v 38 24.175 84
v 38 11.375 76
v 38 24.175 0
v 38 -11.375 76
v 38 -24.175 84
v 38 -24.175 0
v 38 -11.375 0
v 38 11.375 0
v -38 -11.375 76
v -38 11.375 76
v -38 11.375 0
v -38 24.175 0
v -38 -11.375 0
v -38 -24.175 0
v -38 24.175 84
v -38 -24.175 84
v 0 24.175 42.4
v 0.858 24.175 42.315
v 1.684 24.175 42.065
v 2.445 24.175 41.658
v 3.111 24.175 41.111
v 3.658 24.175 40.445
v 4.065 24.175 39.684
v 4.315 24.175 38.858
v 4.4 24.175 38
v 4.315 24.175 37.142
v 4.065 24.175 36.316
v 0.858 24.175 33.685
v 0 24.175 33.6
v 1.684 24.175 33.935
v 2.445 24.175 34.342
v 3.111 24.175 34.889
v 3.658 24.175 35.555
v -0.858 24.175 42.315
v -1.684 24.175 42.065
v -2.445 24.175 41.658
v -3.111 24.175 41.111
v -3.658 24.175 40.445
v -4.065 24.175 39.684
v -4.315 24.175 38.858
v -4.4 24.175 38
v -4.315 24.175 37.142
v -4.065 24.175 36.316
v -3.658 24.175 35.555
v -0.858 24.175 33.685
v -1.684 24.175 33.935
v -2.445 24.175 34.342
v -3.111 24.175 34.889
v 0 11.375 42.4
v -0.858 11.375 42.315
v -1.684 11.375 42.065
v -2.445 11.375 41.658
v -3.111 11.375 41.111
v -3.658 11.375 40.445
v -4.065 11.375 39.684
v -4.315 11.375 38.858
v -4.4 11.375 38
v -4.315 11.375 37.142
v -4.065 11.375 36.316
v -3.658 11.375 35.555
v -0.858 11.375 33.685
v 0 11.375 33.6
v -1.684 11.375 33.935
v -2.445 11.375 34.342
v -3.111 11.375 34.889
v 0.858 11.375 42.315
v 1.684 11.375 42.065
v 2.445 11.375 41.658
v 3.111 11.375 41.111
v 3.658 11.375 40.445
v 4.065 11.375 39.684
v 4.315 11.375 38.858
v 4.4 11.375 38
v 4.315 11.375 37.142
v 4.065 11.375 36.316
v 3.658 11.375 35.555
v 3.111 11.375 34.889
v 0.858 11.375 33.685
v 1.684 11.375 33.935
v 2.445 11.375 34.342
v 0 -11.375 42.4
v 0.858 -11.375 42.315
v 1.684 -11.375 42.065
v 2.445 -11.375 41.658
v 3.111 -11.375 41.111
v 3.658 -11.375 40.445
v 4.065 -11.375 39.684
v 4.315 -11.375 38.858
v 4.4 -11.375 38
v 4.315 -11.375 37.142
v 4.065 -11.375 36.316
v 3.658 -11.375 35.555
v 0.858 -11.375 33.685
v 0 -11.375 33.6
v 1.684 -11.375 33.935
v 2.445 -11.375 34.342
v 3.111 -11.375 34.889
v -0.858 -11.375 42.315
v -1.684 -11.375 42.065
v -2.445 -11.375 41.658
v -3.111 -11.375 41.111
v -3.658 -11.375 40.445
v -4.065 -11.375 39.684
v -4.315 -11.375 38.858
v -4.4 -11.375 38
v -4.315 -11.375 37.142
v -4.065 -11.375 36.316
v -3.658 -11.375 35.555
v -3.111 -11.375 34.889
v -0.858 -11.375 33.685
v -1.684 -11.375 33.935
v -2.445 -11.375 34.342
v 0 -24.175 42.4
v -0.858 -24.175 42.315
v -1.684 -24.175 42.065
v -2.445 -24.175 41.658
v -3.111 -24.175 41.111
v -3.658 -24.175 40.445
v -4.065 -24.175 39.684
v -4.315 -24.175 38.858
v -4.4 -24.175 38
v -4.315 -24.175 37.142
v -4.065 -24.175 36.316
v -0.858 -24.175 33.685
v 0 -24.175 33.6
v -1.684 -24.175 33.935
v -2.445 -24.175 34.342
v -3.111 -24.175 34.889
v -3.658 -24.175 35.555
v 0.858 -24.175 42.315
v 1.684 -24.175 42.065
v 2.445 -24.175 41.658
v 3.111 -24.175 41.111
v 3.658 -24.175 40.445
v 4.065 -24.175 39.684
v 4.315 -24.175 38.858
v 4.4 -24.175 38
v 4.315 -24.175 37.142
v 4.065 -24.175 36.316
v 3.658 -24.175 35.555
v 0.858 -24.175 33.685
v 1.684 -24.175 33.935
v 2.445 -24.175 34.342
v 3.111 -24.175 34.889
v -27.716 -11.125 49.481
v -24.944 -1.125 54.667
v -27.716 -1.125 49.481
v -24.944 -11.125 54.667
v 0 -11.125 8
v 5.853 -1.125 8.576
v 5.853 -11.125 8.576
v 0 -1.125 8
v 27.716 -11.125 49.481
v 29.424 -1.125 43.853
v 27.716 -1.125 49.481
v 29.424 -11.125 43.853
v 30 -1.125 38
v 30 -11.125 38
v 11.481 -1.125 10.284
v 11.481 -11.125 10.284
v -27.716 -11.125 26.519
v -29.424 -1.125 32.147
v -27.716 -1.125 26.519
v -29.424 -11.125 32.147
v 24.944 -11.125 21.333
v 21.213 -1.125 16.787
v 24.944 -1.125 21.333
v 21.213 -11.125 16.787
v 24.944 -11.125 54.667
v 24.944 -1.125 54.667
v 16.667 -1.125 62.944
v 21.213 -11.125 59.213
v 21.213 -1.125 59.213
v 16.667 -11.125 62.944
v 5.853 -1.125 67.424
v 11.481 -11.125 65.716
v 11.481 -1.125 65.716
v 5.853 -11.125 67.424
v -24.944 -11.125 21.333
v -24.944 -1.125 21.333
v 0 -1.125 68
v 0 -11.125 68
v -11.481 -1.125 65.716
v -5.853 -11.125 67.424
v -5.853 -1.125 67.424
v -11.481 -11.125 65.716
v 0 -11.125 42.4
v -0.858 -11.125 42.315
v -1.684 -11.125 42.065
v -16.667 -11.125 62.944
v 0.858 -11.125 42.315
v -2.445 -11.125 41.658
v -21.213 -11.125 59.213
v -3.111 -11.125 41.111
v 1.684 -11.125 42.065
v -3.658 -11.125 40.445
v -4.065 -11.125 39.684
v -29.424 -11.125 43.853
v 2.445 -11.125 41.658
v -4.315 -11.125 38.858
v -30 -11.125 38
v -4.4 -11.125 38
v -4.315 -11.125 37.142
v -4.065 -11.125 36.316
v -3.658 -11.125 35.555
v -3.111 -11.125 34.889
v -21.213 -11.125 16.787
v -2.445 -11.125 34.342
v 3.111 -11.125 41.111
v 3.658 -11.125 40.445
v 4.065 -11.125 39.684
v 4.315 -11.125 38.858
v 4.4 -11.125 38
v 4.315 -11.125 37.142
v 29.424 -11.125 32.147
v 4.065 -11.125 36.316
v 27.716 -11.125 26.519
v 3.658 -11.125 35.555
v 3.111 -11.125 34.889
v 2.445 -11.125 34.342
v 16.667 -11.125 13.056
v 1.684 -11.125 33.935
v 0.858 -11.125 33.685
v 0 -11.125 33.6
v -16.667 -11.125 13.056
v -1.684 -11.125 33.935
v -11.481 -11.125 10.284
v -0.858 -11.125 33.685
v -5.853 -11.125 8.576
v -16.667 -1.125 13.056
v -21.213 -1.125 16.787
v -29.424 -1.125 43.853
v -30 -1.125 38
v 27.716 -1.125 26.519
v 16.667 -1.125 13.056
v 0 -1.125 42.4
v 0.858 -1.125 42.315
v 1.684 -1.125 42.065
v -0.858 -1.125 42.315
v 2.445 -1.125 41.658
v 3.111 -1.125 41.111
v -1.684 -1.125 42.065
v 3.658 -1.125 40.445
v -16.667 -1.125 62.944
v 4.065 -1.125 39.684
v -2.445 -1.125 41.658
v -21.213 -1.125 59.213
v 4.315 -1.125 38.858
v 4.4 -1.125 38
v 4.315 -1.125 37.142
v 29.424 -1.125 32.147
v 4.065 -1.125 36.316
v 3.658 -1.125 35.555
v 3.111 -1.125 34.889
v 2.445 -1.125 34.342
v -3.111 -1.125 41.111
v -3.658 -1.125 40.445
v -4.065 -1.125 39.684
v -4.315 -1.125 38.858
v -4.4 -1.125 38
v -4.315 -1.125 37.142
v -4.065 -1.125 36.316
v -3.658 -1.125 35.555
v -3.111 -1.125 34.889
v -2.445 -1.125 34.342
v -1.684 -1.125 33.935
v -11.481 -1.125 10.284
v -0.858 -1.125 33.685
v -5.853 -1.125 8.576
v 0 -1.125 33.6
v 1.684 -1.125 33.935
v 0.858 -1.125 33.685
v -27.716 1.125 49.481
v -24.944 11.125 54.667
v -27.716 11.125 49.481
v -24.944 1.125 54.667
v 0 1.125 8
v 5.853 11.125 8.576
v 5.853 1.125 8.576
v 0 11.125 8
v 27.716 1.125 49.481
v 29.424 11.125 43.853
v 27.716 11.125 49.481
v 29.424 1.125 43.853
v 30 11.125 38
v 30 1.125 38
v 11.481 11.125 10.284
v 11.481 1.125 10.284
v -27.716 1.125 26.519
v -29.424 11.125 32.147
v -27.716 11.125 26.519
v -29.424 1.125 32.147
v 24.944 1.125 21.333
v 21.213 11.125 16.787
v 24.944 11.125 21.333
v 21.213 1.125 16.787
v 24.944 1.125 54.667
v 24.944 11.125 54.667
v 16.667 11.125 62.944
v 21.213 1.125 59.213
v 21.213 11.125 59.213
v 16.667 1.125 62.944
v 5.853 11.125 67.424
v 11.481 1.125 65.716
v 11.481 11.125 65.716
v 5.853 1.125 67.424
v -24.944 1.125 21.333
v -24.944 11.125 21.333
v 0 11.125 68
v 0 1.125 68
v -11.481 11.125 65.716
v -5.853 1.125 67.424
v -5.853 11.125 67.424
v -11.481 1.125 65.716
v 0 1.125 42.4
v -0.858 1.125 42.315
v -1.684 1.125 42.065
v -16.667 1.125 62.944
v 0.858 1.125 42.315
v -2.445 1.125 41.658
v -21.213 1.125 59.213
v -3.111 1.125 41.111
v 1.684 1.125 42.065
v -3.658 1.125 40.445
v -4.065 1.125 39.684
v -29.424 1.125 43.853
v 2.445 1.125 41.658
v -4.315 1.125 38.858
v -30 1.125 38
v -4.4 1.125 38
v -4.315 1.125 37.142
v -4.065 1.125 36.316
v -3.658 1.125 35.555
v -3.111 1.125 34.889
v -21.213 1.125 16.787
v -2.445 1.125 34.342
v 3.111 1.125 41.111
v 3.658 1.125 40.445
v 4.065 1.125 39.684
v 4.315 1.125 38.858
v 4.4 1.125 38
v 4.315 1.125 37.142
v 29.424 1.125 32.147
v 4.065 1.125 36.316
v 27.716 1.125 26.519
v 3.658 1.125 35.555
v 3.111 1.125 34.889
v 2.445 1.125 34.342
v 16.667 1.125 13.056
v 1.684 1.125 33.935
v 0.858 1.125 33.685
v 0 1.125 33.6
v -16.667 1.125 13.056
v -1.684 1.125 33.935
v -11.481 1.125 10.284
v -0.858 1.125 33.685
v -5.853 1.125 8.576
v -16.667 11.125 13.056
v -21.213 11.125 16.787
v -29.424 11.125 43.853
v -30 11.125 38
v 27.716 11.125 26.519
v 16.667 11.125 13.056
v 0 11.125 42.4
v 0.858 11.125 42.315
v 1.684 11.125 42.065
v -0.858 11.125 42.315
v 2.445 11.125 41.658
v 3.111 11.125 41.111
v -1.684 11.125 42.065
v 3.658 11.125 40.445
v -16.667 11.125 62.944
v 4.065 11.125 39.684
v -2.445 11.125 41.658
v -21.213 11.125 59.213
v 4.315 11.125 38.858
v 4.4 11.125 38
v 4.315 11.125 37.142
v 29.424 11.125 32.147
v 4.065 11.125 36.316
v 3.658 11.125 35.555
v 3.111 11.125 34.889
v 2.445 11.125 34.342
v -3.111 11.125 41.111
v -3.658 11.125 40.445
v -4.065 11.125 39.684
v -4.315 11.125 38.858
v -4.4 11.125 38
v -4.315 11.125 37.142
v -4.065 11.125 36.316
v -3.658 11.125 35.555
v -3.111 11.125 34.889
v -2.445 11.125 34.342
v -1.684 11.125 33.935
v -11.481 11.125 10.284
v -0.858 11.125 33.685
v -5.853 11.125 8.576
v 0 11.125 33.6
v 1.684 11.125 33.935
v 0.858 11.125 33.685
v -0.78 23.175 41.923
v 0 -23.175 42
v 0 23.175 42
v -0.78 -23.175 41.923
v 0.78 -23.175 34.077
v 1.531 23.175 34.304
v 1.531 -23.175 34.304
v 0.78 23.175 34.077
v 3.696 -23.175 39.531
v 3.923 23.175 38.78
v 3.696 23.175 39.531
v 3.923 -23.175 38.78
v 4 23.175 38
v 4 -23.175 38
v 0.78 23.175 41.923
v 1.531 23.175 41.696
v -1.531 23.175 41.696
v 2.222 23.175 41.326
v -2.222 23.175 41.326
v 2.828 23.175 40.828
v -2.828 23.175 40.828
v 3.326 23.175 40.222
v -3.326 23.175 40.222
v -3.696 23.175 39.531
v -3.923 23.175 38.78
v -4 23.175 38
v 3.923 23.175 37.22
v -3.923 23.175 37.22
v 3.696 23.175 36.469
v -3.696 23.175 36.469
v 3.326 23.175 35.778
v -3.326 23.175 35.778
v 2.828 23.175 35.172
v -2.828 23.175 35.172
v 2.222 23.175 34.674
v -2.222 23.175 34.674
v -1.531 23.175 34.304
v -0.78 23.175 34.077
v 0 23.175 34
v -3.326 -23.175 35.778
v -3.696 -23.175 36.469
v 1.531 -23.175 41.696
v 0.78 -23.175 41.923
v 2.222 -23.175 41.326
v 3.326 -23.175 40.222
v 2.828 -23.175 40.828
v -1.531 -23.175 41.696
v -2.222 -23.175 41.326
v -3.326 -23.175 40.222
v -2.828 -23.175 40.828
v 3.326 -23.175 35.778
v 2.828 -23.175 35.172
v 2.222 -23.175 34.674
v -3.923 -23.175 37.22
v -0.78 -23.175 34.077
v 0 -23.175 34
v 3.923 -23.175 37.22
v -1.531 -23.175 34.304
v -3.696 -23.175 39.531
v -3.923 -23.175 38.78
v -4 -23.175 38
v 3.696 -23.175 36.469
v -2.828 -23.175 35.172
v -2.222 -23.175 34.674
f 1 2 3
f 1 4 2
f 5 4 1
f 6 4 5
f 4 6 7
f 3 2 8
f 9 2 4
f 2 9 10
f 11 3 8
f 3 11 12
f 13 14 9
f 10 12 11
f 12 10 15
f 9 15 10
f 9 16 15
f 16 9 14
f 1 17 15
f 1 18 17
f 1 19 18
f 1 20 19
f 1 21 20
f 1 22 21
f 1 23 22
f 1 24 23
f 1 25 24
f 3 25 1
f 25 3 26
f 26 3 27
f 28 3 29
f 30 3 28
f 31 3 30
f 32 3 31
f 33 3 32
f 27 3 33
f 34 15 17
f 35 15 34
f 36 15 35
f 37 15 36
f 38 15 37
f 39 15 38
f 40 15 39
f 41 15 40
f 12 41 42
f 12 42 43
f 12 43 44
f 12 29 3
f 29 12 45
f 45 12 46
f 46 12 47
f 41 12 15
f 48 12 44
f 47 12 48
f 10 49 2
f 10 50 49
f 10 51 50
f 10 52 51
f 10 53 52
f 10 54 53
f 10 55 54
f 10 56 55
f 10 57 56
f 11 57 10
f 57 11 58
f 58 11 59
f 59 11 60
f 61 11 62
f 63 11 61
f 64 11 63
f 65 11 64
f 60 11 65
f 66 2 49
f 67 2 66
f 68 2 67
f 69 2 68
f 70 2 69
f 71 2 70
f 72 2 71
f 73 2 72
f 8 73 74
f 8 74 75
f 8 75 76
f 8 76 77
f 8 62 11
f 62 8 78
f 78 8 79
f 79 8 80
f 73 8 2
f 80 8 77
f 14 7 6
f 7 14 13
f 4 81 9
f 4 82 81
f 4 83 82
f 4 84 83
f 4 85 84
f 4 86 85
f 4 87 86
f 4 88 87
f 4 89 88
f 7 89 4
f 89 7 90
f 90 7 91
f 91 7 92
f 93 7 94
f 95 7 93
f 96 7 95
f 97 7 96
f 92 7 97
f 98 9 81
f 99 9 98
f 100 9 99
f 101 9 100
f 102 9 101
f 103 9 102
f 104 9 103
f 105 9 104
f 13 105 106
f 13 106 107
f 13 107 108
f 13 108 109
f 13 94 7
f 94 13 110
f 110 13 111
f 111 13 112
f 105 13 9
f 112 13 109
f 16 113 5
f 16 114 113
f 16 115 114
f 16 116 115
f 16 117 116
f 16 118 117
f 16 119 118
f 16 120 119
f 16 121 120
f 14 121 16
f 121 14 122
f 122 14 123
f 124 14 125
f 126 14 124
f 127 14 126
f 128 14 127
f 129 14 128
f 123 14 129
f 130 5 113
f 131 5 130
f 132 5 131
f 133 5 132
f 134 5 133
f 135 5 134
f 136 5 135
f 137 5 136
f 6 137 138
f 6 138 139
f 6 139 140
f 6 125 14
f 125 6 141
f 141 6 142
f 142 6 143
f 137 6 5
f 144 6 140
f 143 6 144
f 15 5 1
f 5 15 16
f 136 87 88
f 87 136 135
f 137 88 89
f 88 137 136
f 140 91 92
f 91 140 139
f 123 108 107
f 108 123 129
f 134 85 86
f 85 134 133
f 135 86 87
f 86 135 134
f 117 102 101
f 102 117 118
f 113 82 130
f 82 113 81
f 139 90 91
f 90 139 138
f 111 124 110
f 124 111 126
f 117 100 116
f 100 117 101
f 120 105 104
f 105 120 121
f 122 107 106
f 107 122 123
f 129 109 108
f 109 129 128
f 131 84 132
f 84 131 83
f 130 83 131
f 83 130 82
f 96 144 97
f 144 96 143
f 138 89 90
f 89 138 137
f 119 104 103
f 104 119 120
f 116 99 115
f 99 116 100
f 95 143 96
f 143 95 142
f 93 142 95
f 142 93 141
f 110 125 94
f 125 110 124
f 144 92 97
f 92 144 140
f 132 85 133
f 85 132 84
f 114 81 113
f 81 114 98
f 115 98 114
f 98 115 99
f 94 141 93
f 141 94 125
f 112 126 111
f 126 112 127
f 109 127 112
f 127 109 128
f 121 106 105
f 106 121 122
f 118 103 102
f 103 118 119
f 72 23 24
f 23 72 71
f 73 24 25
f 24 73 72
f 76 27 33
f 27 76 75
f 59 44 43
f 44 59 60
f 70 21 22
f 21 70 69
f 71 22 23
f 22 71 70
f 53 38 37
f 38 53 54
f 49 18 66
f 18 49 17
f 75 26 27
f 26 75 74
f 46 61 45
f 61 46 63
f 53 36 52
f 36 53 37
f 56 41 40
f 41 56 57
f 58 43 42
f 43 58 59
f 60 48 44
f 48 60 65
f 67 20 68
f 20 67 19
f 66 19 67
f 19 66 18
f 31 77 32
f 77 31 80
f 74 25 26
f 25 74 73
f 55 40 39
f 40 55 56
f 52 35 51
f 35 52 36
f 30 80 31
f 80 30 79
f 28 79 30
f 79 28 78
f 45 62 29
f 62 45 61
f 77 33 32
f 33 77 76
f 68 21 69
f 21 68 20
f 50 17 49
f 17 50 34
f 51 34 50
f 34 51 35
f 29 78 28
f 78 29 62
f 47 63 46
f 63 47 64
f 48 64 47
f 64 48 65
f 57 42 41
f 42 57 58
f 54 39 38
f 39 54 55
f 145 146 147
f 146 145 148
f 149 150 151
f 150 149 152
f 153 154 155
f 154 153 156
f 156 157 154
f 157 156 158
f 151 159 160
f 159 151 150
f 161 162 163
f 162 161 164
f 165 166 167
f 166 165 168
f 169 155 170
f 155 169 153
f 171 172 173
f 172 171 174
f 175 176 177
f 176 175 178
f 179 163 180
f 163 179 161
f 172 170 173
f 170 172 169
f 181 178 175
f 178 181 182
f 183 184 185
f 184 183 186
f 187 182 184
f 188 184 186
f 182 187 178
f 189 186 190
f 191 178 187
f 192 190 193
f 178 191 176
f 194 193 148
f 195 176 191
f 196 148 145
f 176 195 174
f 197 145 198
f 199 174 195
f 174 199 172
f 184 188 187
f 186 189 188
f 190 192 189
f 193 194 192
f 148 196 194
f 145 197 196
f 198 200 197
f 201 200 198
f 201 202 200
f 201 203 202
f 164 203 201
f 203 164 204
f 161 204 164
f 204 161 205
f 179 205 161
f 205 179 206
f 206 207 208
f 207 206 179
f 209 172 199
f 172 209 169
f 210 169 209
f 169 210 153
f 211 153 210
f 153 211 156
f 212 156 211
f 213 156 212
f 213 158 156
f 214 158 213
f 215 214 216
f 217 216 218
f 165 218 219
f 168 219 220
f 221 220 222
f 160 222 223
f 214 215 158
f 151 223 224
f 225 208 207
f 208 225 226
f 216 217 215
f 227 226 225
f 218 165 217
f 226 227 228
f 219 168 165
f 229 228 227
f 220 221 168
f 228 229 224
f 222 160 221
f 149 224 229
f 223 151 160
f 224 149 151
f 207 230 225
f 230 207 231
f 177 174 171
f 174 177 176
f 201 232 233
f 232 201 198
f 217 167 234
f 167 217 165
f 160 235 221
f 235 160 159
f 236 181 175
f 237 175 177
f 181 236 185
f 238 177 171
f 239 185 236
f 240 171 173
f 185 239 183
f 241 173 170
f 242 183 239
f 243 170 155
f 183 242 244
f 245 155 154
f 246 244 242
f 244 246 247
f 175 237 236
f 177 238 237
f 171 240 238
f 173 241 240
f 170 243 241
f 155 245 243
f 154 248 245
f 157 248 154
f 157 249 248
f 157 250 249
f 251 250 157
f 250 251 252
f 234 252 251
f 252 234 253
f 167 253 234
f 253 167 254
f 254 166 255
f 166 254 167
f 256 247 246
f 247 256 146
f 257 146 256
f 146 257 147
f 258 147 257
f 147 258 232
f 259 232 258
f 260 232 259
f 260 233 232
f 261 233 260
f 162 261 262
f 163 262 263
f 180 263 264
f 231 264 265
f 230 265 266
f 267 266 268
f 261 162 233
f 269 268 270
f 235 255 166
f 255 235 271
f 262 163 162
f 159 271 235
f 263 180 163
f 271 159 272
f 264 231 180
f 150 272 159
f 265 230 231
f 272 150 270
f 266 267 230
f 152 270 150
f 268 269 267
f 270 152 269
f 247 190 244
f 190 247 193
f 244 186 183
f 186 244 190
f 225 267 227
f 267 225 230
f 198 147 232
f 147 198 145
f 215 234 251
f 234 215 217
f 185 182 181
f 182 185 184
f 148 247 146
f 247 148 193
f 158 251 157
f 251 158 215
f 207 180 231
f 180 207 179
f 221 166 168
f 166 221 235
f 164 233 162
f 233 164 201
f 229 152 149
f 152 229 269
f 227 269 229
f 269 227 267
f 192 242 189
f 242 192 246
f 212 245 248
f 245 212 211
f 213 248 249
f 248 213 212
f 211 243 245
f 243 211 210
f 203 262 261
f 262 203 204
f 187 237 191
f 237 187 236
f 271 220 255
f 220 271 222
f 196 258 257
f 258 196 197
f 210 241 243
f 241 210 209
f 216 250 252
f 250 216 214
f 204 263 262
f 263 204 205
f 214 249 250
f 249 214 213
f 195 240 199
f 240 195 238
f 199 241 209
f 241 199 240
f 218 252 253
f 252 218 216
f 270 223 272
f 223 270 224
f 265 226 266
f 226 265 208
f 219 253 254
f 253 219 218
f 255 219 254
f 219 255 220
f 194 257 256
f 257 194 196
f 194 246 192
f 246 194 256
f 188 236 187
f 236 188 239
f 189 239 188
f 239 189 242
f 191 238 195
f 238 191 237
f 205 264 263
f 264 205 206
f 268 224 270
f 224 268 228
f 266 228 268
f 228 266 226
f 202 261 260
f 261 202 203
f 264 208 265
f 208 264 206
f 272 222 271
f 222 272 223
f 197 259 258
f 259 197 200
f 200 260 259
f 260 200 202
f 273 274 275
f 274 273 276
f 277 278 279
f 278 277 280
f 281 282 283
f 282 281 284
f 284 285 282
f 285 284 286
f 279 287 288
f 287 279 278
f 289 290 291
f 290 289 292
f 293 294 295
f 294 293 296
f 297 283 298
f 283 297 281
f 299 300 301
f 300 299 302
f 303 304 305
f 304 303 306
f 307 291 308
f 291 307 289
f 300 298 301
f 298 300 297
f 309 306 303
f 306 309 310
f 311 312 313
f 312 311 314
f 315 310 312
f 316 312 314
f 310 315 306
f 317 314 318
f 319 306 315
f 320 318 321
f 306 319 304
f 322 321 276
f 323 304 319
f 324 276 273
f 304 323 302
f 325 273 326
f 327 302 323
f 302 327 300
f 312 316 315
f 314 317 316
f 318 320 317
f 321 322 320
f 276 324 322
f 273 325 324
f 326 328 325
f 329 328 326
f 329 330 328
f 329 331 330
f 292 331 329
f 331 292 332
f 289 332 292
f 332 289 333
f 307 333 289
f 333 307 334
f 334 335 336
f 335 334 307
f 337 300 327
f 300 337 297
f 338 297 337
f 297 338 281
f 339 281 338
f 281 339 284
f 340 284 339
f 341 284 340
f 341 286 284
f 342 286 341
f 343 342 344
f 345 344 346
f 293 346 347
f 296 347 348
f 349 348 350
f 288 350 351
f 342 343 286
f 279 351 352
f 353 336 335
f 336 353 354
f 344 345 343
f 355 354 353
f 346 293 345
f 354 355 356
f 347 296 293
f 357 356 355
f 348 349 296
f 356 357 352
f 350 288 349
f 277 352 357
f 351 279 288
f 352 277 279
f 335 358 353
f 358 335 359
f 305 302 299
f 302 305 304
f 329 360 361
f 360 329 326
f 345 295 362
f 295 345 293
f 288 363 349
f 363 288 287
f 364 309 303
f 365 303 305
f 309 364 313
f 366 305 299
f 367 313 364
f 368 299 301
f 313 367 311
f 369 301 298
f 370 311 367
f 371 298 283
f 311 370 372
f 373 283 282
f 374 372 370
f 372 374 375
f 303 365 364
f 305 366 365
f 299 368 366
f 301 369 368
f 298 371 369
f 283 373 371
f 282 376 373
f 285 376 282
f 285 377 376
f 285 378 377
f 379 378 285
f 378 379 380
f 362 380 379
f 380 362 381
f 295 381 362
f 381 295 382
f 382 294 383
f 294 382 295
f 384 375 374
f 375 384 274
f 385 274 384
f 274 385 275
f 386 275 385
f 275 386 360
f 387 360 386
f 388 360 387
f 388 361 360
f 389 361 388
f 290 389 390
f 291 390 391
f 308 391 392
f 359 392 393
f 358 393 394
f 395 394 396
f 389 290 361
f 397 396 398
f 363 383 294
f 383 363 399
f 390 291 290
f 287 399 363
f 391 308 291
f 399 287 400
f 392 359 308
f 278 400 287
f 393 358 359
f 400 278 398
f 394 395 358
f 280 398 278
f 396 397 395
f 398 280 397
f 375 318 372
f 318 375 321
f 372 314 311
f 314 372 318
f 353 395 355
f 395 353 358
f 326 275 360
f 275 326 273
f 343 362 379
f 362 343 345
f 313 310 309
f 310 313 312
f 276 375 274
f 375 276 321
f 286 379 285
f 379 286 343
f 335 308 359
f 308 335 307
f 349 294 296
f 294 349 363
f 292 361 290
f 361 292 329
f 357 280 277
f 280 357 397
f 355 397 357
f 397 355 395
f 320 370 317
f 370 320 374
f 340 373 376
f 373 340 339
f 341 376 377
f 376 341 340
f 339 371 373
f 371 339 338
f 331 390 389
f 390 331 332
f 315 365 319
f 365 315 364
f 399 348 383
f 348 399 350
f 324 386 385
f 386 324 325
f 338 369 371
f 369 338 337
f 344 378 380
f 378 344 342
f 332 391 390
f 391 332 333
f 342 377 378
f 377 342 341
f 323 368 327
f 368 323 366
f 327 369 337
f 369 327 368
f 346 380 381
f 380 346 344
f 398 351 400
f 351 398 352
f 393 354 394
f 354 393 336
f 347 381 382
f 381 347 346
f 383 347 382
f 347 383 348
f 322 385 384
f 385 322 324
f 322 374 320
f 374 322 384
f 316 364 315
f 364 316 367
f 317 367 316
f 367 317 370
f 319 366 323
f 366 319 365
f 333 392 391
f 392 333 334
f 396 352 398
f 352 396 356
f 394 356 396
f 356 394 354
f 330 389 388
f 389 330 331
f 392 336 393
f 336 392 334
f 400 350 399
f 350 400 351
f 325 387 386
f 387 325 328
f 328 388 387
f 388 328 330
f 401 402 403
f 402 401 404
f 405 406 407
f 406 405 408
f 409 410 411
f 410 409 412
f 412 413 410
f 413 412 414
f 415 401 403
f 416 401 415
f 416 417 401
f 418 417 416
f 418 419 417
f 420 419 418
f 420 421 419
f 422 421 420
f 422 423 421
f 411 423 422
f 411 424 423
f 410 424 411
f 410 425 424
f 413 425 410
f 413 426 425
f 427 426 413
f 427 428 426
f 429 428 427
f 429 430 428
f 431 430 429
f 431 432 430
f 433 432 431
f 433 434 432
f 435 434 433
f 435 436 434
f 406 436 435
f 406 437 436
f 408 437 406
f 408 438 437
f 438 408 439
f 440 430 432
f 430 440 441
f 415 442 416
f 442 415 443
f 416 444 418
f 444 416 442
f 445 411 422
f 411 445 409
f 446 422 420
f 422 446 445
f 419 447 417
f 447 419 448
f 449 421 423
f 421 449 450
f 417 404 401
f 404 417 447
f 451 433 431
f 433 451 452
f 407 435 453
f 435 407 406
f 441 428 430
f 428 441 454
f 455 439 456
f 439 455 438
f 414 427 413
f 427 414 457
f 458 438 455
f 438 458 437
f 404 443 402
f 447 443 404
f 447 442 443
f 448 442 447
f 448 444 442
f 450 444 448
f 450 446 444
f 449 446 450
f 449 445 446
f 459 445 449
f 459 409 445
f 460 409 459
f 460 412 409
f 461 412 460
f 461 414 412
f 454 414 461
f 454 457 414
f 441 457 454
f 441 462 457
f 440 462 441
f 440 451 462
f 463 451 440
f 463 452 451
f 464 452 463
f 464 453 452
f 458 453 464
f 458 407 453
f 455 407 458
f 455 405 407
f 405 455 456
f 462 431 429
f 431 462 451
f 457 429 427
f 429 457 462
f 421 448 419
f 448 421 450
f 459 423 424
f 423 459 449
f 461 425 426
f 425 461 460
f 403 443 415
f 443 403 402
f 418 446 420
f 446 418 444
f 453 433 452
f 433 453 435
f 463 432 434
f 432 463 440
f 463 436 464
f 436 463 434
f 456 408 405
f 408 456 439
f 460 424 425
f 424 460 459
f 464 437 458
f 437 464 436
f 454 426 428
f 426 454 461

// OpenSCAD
$fn = 32;

// ------------------------------------------------------------------------
// Trolley wheel set: wheels d60, fork 76 mm tall
// Every part is its own module, assembly() places every instance.
// ------------------------------------------------------------------------

// --- part 1 ---
module trolley_fork() {
  difference() {
    union() {
      translate([-38, 11.375, 0]) cube([76, 12.8, 76]);
      translate([-38, -24.175, 0]) cube([76, 12.8, 76]);
      translate([-38, -24.175, 76]) cube([76, 48.35, 8]);
    }
    translate([0, -17.775, 38]) rotate([90, 0, 0]) cylinder(h = 14.8, d = 8.8, center = true);
    translate([0, 17.775, 38]) rotate([90, 0, 0]) cylinder(h = 14.8, d = 8.8, center = true);
  }
}

// --- part 2 ---
module trolley_wheel() {
  difference() {
      translate([0, 0, 0]) cylinder(h = 10, d = 60);
      translate([0, 0, -1]) cylinder(h = 12, d = 8.8);
    }
}

// --- part 3 ---
module trolley_axle() {
  translate([0, 0, -23.175]) cylinder(h = 46.35, d = 8);
}

// --- assembly ---
module assembly() {
  color([0.80, 0.24, 0.20]) translate([0, 0, 0]) rotate([0, 0, 0]) trolley_fork();
  color([0.20, 0.45, 0.75]) translate([0, -1.125, 38]) rotate([90, 0, 0]) trolley_wheel();
  color([0.25, 0.62, 0.32]) translate([0, 11.125, 38]) rotate([90, 0, 0]) trolley_wheel();
  color([0.92, 0.70, 0.18]) translate([0, 0, 38]) rotate([90, 0, 0]) trolley_axle();
}

assembly();
